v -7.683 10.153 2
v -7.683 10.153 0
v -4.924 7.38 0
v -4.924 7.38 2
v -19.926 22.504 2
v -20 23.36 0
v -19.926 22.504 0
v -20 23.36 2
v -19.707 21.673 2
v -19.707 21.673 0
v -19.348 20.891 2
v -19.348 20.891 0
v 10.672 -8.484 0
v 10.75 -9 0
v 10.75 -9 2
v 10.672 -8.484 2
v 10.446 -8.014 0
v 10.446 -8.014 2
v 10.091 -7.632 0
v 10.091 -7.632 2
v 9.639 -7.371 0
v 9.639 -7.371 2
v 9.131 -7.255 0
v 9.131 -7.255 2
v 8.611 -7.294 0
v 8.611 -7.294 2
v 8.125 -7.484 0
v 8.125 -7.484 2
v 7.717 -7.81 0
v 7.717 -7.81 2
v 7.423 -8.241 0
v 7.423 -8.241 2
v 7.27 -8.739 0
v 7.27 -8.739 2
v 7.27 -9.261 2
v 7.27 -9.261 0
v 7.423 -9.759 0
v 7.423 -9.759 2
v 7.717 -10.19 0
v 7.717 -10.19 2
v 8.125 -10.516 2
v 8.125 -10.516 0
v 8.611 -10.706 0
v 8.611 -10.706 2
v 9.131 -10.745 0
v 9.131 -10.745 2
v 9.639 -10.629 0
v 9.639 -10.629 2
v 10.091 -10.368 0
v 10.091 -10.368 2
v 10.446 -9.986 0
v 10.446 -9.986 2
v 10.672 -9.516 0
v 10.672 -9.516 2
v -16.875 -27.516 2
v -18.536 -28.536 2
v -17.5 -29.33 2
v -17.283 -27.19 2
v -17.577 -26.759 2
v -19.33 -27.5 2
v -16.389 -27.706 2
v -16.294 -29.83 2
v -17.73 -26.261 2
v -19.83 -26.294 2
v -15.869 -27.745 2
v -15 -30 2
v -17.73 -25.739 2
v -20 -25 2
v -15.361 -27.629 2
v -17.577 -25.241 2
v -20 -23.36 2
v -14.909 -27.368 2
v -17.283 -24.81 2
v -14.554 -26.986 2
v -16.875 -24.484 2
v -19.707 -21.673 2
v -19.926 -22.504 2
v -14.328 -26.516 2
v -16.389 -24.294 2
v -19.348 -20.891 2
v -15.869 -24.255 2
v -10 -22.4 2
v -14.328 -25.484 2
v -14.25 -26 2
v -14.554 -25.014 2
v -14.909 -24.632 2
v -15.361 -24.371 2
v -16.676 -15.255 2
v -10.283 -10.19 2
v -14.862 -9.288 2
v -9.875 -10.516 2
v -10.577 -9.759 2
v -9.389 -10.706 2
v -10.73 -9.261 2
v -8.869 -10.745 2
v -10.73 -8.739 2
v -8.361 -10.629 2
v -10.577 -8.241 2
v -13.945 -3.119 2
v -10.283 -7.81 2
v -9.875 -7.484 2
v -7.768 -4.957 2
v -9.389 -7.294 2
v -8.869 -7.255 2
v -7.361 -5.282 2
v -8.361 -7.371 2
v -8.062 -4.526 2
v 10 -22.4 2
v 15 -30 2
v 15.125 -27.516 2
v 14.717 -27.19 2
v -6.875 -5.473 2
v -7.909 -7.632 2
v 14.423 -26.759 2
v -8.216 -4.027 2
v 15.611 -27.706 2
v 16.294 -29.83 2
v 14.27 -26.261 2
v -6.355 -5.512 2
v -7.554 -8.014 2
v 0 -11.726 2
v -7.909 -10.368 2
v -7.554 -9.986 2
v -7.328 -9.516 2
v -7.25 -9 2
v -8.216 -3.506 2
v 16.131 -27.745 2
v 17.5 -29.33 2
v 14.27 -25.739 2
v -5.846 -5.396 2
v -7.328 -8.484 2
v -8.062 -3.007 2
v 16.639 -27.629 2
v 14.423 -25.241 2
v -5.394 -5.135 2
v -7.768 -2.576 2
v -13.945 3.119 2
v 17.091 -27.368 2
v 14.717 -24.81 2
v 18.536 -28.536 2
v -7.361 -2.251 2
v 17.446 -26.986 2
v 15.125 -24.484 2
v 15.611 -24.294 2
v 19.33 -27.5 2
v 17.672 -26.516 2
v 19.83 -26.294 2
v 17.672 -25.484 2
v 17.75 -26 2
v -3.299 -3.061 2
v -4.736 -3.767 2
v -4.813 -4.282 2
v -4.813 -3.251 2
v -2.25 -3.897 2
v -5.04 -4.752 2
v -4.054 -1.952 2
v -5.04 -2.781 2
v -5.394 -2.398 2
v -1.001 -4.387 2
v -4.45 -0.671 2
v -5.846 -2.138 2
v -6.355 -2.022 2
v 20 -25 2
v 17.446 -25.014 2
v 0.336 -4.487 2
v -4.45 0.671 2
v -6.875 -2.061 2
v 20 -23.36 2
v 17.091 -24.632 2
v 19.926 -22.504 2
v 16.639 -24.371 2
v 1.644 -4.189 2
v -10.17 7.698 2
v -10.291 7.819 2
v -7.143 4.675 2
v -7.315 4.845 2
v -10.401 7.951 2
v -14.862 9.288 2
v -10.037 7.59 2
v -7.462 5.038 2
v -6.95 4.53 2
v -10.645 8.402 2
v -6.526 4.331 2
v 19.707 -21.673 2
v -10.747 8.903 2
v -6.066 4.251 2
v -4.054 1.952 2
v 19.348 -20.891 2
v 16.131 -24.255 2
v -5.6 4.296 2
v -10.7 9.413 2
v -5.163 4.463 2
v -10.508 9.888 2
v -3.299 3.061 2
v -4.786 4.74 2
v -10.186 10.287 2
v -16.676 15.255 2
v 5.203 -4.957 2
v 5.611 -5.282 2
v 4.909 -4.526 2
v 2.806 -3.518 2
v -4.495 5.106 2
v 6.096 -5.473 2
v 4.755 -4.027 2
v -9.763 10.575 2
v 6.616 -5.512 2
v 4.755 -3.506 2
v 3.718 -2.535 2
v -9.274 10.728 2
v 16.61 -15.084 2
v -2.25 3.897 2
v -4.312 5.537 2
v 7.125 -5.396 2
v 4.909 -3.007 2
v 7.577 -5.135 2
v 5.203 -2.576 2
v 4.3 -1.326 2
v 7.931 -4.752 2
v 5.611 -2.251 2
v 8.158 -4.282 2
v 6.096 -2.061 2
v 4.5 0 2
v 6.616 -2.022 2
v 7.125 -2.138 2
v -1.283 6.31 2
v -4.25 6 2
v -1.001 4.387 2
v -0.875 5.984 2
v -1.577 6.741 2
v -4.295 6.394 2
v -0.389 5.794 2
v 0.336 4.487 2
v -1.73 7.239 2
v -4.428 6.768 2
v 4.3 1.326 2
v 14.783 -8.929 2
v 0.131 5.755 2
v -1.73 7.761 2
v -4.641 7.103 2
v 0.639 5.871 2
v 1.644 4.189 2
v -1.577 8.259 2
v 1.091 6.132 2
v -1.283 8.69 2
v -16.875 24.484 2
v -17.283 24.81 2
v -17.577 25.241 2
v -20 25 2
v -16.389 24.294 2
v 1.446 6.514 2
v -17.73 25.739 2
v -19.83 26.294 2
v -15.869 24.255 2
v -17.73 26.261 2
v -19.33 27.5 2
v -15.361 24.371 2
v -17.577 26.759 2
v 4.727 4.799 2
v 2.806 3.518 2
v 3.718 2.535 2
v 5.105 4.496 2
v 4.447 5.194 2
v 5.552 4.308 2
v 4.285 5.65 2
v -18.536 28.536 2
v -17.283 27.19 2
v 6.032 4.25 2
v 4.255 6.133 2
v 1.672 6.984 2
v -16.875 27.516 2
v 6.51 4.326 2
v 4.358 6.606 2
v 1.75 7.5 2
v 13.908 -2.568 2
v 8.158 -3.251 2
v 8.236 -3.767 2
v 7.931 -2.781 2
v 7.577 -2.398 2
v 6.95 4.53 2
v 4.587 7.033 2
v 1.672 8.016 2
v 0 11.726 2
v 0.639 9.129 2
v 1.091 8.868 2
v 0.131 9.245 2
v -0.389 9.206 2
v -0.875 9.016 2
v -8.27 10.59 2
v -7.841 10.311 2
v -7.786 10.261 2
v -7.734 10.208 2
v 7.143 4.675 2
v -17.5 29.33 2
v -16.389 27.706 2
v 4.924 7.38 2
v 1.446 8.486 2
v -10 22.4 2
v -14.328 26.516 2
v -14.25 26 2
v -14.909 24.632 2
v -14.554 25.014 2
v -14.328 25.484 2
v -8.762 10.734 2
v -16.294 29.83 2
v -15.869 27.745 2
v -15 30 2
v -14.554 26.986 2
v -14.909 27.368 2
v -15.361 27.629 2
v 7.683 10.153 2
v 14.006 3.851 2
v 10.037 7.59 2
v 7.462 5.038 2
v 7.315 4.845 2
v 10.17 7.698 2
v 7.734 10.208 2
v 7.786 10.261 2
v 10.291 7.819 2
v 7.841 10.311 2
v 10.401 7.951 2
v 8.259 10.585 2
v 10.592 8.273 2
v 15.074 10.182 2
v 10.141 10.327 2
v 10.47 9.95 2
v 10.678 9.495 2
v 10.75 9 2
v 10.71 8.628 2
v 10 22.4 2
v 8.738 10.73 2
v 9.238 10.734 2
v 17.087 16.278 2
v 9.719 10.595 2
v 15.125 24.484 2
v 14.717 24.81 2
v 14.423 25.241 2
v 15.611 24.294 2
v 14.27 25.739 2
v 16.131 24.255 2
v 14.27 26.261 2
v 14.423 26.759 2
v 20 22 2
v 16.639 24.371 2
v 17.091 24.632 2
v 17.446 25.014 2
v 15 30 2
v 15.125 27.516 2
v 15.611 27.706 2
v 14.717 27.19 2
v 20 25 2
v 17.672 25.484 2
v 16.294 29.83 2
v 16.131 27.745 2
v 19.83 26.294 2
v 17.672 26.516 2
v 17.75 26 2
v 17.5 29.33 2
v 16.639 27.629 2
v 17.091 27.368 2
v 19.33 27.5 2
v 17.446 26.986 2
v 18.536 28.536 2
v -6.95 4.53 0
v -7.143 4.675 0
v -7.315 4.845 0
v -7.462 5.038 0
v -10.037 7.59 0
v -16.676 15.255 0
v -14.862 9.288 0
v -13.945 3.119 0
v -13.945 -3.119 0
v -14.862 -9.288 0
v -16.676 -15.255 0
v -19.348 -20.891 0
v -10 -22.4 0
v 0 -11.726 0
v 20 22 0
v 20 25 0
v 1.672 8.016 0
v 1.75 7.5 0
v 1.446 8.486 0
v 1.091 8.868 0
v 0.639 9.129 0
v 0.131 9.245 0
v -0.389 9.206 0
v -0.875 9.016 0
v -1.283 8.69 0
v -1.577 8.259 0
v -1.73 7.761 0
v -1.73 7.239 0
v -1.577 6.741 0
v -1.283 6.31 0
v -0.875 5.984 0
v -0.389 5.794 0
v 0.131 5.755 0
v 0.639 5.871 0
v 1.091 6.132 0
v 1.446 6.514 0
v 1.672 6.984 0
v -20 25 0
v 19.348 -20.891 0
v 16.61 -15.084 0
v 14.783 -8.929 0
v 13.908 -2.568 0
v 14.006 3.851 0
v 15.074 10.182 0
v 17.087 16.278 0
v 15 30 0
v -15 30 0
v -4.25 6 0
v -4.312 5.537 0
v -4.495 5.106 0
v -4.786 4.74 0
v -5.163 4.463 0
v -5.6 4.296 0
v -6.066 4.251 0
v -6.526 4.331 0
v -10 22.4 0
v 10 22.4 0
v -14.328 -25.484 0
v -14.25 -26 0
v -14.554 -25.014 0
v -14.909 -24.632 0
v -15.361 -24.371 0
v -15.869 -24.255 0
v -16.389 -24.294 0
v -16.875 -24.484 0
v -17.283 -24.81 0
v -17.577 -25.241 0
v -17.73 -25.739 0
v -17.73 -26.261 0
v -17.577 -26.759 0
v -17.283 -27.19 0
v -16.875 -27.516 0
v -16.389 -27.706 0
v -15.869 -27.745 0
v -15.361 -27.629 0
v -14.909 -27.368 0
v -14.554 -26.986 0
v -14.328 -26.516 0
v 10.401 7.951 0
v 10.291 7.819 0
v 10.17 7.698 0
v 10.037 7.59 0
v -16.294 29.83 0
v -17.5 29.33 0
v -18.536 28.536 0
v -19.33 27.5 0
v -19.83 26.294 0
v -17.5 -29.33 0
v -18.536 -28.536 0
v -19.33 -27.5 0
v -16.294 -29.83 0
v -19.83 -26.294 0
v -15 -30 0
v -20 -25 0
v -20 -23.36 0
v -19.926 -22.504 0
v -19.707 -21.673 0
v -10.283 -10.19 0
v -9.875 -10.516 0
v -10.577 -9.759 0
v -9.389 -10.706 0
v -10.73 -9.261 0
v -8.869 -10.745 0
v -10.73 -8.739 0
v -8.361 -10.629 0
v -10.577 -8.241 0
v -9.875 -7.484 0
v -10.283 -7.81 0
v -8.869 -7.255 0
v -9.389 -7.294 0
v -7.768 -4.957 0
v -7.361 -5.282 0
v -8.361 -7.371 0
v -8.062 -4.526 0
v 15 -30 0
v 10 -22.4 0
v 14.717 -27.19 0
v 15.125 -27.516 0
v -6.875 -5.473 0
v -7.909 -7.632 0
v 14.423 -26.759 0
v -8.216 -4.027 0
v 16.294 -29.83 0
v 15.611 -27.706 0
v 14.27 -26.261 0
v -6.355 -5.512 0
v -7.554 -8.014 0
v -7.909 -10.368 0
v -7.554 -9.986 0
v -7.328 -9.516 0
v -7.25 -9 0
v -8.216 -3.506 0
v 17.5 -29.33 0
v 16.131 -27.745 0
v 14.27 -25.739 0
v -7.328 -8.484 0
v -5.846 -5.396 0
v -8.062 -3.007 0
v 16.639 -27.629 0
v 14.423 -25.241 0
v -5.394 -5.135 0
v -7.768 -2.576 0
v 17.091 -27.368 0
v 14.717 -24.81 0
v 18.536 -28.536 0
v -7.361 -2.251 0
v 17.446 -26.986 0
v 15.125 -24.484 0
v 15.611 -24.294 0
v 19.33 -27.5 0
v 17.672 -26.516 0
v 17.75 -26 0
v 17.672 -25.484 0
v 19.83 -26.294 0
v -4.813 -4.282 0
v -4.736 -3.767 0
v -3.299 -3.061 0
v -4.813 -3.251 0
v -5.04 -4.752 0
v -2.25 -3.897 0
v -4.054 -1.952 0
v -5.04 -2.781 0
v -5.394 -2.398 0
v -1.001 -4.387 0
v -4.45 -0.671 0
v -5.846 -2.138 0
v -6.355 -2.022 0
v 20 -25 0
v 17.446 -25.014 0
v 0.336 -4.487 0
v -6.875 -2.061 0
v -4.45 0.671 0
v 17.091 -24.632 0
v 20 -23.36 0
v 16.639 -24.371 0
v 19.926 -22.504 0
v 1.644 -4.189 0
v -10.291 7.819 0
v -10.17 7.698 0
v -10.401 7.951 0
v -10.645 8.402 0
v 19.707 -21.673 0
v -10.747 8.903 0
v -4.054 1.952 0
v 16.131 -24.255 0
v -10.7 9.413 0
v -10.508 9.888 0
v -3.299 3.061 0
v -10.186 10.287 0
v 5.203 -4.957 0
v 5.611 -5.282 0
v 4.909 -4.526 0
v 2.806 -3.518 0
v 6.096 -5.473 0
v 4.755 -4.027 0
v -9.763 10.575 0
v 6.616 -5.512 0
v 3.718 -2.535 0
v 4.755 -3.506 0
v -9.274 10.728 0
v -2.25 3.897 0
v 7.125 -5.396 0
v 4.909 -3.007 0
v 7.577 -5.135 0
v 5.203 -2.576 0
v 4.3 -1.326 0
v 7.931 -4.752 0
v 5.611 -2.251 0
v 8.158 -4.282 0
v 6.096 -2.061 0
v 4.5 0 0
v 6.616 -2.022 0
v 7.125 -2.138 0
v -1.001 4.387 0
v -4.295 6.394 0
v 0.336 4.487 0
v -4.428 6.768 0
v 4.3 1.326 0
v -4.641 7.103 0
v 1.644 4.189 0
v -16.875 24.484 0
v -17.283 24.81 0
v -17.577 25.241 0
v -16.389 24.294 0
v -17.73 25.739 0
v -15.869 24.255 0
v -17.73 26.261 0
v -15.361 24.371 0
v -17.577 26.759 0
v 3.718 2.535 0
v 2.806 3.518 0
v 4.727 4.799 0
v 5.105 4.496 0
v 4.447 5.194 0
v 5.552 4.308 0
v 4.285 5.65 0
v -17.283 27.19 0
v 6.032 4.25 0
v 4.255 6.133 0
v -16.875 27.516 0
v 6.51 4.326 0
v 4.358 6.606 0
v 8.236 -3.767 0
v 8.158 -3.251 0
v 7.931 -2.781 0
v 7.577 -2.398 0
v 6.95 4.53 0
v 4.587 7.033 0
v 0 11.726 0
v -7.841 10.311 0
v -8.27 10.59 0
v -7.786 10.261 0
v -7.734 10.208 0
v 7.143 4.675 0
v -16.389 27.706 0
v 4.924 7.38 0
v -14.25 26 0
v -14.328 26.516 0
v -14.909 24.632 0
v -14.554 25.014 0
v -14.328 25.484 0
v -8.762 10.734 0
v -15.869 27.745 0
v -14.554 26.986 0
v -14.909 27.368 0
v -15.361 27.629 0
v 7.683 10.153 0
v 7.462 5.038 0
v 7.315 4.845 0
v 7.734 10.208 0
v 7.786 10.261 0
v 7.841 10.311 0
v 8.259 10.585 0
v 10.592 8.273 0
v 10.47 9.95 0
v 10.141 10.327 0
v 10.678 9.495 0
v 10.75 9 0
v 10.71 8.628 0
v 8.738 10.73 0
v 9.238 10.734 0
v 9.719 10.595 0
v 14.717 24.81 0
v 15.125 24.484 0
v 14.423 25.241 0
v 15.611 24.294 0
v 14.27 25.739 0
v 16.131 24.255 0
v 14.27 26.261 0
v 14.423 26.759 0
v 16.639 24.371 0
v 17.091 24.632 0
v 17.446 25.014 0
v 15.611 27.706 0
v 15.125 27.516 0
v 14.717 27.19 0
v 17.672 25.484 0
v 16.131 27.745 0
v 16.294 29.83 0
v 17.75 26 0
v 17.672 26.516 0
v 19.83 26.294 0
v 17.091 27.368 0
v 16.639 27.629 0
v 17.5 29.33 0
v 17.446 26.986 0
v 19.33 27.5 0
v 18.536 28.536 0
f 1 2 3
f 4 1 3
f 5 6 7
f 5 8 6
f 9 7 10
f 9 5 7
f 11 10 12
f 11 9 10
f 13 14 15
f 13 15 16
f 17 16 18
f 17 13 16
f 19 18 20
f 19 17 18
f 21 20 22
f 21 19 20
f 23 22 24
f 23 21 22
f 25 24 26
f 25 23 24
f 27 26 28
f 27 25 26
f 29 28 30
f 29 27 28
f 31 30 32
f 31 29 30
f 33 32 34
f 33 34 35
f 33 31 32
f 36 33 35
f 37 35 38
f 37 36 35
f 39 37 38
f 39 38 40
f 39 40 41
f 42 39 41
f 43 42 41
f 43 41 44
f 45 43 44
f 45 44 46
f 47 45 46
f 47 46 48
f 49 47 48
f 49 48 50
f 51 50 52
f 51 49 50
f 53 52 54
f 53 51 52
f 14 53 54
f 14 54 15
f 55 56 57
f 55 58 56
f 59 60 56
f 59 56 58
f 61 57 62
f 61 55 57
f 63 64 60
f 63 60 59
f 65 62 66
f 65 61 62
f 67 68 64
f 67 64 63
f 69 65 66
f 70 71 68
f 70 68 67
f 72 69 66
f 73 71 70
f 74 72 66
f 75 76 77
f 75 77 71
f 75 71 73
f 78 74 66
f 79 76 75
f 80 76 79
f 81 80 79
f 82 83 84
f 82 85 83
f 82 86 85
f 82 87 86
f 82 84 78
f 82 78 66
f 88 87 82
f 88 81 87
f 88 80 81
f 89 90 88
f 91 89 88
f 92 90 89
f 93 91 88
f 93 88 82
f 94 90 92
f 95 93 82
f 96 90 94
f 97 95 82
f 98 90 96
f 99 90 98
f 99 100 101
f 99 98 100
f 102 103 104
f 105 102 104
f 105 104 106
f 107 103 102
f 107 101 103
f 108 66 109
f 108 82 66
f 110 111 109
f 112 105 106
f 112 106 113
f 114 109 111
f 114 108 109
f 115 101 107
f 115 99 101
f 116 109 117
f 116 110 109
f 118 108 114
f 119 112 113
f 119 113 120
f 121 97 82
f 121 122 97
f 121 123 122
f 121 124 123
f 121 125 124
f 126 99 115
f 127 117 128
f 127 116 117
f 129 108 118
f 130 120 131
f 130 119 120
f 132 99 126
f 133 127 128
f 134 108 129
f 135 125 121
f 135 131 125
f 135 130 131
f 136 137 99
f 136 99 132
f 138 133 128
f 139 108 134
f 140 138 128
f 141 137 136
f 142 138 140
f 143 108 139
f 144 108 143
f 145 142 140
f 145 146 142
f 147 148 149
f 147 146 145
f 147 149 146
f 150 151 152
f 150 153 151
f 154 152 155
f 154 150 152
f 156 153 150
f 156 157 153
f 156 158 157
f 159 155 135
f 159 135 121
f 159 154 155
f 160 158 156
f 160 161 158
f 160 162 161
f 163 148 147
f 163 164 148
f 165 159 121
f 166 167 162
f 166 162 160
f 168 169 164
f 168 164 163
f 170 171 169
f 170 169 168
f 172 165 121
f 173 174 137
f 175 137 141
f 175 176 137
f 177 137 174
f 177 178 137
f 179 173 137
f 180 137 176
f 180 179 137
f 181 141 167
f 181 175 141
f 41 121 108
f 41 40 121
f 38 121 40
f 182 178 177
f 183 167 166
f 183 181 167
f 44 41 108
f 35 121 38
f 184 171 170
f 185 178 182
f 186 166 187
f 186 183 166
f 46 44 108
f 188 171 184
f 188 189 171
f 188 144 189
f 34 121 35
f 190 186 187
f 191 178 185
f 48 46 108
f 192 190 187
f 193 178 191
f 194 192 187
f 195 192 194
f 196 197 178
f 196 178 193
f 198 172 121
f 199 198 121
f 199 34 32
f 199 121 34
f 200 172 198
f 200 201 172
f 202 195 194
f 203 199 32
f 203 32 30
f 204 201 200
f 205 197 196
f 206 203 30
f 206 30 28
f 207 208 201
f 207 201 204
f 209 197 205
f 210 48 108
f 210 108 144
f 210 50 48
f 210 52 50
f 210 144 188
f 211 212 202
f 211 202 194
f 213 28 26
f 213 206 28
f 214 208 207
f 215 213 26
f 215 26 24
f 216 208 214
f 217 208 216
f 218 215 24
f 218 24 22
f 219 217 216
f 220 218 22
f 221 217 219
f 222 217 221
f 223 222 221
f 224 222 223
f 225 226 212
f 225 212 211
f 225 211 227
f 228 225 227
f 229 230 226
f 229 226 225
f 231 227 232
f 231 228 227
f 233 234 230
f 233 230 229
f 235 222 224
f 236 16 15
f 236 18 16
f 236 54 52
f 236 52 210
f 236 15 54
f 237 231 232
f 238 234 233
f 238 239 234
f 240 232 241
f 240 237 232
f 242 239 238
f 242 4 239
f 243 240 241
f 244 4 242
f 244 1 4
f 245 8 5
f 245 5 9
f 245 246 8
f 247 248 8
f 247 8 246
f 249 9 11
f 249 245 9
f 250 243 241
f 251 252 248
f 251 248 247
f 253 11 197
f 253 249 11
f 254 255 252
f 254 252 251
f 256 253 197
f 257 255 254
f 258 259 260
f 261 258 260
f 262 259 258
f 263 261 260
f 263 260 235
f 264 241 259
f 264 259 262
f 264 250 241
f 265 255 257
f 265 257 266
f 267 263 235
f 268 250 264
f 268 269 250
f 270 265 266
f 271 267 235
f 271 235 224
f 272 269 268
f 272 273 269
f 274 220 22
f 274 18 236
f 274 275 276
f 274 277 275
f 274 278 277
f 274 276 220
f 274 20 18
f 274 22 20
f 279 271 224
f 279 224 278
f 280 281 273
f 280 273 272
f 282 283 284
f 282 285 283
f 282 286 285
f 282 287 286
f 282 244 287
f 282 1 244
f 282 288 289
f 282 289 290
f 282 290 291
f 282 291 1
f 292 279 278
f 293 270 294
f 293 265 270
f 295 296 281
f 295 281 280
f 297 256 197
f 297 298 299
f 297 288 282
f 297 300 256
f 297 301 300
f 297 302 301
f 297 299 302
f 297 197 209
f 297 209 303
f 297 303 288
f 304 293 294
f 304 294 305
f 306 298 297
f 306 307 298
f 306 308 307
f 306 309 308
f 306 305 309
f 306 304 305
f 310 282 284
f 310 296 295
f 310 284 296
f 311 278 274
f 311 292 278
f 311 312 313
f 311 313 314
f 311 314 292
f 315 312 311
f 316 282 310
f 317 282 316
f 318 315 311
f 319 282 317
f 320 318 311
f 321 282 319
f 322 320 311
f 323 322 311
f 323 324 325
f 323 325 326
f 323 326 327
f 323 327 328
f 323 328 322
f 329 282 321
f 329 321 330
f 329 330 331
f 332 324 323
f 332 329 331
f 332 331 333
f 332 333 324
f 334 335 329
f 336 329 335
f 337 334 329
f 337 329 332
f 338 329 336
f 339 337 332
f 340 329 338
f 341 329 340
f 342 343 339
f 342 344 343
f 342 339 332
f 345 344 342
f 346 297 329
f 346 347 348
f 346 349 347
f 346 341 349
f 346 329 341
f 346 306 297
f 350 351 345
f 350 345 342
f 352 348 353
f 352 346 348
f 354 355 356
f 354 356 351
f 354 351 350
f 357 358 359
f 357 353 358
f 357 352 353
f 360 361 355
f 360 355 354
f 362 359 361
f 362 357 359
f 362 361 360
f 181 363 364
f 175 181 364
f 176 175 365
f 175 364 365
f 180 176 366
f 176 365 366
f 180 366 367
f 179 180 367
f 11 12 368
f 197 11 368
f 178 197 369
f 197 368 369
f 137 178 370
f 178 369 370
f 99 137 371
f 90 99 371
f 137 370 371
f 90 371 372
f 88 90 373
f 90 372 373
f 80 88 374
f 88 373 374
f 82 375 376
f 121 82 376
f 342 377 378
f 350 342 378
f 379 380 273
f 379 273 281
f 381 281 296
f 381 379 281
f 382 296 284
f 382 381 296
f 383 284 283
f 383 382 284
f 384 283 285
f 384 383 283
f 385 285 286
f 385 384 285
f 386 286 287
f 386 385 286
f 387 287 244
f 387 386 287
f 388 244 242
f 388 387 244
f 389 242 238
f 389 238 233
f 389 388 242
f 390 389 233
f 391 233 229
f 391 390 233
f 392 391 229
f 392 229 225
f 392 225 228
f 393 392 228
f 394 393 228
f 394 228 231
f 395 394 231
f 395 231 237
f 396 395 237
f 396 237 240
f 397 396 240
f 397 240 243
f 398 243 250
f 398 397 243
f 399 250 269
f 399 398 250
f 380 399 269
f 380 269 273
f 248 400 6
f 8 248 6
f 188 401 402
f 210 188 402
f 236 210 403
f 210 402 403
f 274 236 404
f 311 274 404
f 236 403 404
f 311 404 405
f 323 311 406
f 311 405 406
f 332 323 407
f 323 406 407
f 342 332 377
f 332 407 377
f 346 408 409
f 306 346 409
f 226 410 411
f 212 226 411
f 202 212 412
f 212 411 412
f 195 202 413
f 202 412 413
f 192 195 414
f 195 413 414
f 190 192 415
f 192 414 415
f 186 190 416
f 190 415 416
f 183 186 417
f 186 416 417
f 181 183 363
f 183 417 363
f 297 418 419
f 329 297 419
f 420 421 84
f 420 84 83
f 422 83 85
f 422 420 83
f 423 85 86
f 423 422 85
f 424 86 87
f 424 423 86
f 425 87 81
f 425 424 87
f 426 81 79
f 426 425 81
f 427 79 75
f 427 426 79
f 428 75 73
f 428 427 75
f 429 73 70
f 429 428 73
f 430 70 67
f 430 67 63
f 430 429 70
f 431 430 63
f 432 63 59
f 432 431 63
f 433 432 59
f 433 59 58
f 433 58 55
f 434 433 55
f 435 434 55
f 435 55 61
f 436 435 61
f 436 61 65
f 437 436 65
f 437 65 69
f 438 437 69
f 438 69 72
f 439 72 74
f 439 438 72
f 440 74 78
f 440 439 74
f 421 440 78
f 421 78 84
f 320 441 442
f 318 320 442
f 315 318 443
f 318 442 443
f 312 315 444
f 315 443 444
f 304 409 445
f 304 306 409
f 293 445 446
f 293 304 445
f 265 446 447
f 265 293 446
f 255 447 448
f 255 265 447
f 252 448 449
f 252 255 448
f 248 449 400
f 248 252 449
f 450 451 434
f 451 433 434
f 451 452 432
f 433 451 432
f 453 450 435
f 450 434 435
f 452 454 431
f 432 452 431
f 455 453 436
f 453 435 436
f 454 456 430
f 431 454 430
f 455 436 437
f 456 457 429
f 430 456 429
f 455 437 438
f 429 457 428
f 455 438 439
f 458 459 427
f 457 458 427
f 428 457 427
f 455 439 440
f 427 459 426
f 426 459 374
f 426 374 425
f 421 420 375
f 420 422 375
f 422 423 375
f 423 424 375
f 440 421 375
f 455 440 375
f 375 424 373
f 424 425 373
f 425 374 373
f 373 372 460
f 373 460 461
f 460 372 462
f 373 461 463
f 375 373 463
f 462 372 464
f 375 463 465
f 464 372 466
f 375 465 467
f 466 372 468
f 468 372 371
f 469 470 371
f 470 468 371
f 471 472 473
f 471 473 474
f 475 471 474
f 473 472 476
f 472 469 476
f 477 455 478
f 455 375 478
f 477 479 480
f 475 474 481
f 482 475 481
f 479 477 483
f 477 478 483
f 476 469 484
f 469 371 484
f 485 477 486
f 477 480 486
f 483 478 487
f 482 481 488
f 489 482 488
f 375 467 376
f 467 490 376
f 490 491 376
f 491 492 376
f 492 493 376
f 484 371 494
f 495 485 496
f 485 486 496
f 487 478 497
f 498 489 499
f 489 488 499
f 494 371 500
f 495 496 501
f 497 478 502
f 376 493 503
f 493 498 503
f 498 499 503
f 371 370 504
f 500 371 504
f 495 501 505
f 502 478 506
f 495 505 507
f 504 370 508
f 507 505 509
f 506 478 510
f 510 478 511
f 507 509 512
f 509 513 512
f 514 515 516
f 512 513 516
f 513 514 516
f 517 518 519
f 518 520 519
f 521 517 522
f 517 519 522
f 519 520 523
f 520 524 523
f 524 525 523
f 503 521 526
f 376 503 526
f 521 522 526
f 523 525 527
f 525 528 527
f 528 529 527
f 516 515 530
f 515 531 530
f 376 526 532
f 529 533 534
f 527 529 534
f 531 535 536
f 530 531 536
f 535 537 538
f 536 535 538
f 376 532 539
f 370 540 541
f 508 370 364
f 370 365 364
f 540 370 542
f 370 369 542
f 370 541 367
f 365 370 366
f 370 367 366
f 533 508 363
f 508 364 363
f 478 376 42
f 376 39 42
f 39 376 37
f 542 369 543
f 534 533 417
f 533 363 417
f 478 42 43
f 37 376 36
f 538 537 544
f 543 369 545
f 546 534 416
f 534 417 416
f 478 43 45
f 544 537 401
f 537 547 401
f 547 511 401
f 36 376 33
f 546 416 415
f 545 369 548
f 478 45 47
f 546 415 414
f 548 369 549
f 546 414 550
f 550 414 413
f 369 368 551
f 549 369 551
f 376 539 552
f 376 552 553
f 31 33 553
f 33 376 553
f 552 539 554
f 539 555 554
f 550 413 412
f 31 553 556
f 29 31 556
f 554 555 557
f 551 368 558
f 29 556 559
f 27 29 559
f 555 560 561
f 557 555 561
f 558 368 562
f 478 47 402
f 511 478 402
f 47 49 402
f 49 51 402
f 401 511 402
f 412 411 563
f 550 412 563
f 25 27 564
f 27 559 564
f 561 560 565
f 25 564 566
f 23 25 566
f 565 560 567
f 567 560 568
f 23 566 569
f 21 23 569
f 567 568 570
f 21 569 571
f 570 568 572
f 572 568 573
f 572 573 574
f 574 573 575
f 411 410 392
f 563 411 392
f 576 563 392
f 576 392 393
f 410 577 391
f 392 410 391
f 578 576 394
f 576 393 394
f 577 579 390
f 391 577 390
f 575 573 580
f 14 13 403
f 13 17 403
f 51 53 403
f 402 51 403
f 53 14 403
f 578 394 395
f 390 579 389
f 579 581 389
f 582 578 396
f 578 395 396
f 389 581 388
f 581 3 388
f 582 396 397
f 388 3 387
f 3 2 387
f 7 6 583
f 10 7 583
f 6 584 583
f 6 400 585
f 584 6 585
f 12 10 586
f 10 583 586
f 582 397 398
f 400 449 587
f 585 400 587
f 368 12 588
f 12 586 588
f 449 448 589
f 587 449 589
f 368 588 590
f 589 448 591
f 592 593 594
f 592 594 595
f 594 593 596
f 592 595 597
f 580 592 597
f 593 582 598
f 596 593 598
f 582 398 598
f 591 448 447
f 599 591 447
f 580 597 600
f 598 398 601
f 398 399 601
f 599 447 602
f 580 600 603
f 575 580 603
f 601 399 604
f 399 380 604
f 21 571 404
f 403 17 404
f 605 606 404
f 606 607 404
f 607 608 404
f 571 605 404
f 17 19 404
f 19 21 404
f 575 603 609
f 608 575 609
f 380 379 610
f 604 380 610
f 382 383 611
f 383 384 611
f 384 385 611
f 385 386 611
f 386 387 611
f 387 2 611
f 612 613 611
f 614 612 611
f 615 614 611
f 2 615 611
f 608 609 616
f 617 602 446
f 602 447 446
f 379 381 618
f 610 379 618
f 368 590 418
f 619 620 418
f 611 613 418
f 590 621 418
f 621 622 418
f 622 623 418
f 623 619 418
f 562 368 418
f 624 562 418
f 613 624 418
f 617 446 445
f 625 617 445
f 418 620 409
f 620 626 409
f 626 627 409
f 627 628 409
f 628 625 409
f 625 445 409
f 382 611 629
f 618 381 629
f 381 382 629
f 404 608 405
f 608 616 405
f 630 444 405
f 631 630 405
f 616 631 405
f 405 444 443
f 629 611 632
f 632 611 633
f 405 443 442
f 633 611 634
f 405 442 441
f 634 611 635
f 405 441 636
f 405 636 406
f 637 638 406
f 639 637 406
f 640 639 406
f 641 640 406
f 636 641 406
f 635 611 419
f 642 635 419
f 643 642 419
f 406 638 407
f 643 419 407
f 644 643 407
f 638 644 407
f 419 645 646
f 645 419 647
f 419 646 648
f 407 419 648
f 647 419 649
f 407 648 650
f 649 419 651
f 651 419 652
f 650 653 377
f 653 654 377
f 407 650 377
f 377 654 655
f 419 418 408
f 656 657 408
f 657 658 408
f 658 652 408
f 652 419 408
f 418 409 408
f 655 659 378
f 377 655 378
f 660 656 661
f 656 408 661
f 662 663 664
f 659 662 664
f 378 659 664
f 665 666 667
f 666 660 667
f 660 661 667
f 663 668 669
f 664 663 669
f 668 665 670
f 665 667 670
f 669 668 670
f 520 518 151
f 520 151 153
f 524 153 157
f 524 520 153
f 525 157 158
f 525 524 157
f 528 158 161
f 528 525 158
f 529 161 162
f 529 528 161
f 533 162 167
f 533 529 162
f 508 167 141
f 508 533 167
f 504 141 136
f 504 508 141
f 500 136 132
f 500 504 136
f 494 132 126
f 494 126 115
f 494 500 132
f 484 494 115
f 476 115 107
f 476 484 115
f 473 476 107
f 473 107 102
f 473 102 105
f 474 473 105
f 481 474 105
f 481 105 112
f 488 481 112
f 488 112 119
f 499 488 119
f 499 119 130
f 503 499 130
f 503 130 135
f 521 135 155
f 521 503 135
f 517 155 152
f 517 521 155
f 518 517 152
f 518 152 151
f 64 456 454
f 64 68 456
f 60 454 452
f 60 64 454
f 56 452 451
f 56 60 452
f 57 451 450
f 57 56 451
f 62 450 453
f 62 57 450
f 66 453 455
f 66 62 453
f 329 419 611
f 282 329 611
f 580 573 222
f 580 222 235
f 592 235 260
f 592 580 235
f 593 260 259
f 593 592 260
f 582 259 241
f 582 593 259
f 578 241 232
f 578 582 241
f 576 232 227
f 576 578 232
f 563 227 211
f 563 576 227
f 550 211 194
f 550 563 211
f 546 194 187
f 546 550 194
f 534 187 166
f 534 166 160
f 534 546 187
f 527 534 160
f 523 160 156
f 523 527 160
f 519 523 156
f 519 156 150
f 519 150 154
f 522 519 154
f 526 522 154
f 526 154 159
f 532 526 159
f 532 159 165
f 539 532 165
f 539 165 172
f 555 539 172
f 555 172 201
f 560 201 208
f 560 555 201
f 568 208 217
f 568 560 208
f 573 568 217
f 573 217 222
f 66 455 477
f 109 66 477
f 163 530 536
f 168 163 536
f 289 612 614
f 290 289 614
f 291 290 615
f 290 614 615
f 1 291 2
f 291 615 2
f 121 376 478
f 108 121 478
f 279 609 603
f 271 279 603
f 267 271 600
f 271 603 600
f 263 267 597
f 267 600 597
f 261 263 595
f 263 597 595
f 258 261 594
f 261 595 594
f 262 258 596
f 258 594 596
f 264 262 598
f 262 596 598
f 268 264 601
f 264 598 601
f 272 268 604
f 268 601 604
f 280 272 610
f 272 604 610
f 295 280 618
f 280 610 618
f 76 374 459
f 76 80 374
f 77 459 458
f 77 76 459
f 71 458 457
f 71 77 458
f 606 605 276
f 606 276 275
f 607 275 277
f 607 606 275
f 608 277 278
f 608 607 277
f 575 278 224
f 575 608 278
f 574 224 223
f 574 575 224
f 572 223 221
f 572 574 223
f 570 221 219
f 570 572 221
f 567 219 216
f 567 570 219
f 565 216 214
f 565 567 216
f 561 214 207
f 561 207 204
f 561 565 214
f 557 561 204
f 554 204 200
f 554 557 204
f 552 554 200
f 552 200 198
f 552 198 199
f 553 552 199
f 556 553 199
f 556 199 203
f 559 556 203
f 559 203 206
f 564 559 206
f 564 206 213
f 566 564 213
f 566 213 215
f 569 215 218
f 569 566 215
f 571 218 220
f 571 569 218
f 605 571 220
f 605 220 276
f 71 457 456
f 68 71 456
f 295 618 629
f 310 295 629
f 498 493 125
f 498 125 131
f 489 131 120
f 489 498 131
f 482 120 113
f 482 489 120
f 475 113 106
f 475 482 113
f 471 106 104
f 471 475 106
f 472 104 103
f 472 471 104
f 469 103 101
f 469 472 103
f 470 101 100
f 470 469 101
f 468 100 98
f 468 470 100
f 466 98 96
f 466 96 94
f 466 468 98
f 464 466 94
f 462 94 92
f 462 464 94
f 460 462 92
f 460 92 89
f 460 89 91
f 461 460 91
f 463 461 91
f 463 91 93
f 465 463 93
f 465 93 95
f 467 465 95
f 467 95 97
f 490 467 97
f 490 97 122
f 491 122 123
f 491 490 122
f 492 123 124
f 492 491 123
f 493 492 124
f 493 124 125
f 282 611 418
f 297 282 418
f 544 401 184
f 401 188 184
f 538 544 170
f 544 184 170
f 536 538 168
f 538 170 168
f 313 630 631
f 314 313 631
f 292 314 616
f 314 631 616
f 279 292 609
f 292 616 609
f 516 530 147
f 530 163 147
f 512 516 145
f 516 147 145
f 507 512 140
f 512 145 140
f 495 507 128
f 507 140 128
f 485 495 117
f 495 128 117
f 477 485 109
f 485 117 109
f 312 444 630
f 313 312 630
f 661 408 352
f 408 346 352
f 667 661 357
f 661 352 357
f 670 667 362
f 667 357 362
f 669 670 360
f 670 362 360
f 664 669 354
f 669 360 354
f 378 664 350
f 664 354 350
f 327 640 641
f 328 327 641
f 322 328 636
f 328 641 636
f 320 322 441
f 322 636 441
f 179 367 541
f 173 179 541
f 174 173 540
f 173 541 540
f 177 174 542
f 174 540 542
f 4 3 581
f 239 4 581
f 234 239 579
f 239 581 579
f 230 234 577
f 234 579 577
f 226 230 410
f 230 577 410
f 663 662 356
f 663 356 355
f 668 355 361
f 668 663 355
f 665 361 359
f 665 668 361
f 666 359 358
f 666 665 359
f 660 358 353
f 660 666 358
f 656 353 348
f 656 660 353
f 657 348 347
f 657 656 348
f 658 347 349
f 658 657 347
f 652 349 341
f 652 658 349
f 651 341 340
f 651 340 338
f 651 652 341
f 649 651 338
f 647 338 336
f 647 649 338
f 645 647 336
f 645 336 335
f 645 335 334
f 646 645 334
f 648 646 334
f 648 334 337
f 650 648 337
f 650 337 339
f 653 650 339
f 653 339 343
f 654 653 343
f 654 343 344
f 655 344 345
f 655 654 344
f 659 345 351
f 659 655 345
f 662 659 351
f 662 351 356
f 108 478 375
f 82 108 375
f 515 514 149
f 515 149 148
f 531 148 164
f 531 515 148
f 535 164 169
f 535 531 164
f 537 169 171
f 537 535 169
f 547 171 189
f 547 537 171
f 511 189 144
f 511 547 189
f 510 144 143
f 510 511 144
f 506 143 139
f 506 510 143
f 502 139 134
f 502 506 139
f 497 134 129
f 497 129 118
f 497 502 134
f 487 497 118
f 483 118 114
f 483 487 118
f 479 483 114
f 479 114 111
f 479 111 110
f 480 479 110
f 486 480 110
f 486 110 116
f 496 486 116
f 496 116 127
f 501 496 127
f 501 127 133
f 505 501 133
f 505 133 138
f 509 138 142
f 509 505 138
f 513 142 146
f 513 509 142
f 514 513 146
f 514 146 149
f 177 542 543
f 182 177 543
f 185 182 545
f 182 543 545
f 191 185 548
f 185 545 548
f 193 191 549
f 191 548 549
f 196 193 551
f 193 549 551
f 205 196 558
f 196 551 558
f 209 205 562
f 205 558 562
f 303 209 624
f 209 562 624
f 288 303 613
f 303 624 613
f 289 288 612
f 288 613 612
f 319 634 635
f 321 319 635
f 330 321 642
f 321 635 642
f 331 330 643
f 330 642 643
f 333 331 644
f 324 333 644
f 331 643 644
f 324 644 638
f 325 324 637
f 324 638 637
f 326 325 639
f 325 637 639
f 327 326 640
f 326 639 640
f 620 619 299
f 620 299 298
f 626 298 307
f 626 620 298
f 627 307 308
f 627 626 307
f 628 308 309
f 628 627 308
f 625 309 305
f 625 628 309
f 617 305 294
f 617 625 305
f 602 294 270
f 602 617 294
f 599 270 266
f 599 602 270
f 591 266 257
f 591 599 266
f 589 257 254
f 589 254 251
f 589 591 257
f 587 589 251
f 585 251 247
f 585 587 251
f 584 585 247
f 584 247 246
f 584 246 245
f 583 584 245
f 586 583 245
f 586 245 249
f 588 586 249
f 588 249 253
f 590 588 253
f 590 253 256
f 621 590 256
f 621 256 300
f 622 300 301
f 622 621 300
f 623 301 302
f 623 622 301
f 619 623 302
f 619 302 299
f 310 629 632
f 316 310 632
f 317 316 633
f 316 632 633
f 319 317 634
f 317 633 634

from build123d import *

# Parameters (mm, degrees)
F0_R     = 1.75
F0_R_2   = 4.5
F1_DEPTH = 2
F2_R     = 5


with BuildPart() as f1:
    # F0 (on Top) → F1 (new body)
    with BuildSketch(Plane.XY):
        with BuildLine():
            Line((20, 30), (-20, 30))
            Line((-20, 30), (-20, 22))
            ThreePointArc((-20, 22), (-13.8300253787, 0), (-20, -22))
            Line((-20, -22), (-20, -30))
            Line((-20, -30), (20, -30))
            Line((20, -30), (20, -22))
            ThreePointArc((20, -22), (13.8300253787, 0), (20, 22))
            Line((20, 22), (20, 30))
        make_face()
        with Locations((-16, -26)):
            Circle(F0_R, mode=Mode.SUBTRACT)
        with Locations((-9, -9)):
            Circle(F0_R, mode=Mode.SUBTRACT)
        with Locations((-6.4855394704, -3.7666666667)):
            Circle(F0_R, mode=Mode.SUBTRACT)
        Polygon((10, -22.4003139883), (0, -22.4003139883), (-10, -22.4003139883), (0, -11.7255505174), align=None, mode=Mode.SUBTRACT)
        with Locations((16, -26)):
            Circle(F0_R, mode=Mode.SUBTRACT)
        with Locations((9, -9)):
            Circle(F0_R, mode=Mode.SUBTRACT)
        with Locations((6.4855394704, -3.7666666667)):
            Circle(F0_R, mode=Mode.SUBTRACT)
        with BuildLine():
            ThreePointArc((-10.4007968114, 7.9510632559), (-10.1861204729, 10.2867082901), (-7.840755933, 10.310974139))
            ThreePointArc((-7.840755933, 10.310974139), (-7.7595664935, 10.2344329532), (-7.6834199086, 10.1528733074))
            Line((-7.6834199086, 10.1528733074), (-4.9243436791, 7.3803852648))
            ThreePointArc((-4.9243436791, 7.3803852648), (-4.4275976085, 6.7681475895), (-4.25, 6))
            ThreePointArc((-4.25, 6), (-5.1630952479, 4.4630906221), (-6.9495319267, 4.5300037006))
            ThreePointArc((-6.9495319267, 4.5300037006), (-7.2319861689, 4.7571363391), (-7.4615928772, 5.0375831146))
            Line((-7.4615928772, 5.0375831146), (-10.0365828557, 7.5900368858))
            ThreePointArc((-10.0365828557, 7.5900368858), (-10.2319861689, 7.7571363391), (-10.4007968114, 7.9510632559))
        make_face(mode=Mode.SUBTRACT)
        with Locations((-16, 26)):
            Circle(F0_R, mode=Mode.SUBTRACT)
        Circle(F0_R_2, mode=Mode.SUBTRACT)
        with Locations((0, 7.5)):
            Circle(F0_R, mode=Mode.SUBTRACT)
        with BuildLine():
            ThreePointArc((7.840755933, 10.310974139), (9.7189655356, 10.5954900685), (10.75, 9))
            ThreePointArc((10.75, 9), (10.6604057365, 8.4472317031), (10.4007968114, 7.9510632559))
            ThreePointArc((10.4007968114, 7.9510632559), (10.2319861689, 7.7571363391), (10.0365828557, 7.5900368858))
            Line((10.0365828557, 7.5900368858), (7.4615928772, 5.0375831146))
            ThreePointArc((7.4615928772, 5.0375831146), (7.2319861689, 4.7571363391), (6.9495319267, 4.5300037006))
            ThreePointArc((6.9495319267, 4.5300037006), (4.5734147043, 4.9864150781), (4.9243436791, 7.3803852648))
            Line((4.9243436791, 7.3803852648), (7.6834199086, 10.1528733074))
            ThreePointArc((7.6834199086, 10.1528733074), (7.7595664935, 10.2344329532), (7.840755933, 10.310974139))
        make_face(mode=Mode.SUBTRACT)
        Polygon((0, 22.4003139883), (10, 22.4003139883), (0, 11.7255505174), (-10, 22.4003139883), align=None, mode=Mode.SUBTRACT)
        with Locations((16, 26)):
            Circle(F0_R, mode=Mode.SUBTRACT)
    extrude(amount=F1_DEPTH)

    # F2
    f2_edges = [f1.edges().sort_by_distance(p)[0] for p in [
        (-20, 30, 1),
        (-20, -30, 1),
        (20, -30, 1),
        (20, 30, 1),
        (20, -22, 1),
        (-20, -22, 1),
        (-20, 22, 1),
    ]]
    fillet(f2_edges, radius=F2_R)


solid = f1.part
